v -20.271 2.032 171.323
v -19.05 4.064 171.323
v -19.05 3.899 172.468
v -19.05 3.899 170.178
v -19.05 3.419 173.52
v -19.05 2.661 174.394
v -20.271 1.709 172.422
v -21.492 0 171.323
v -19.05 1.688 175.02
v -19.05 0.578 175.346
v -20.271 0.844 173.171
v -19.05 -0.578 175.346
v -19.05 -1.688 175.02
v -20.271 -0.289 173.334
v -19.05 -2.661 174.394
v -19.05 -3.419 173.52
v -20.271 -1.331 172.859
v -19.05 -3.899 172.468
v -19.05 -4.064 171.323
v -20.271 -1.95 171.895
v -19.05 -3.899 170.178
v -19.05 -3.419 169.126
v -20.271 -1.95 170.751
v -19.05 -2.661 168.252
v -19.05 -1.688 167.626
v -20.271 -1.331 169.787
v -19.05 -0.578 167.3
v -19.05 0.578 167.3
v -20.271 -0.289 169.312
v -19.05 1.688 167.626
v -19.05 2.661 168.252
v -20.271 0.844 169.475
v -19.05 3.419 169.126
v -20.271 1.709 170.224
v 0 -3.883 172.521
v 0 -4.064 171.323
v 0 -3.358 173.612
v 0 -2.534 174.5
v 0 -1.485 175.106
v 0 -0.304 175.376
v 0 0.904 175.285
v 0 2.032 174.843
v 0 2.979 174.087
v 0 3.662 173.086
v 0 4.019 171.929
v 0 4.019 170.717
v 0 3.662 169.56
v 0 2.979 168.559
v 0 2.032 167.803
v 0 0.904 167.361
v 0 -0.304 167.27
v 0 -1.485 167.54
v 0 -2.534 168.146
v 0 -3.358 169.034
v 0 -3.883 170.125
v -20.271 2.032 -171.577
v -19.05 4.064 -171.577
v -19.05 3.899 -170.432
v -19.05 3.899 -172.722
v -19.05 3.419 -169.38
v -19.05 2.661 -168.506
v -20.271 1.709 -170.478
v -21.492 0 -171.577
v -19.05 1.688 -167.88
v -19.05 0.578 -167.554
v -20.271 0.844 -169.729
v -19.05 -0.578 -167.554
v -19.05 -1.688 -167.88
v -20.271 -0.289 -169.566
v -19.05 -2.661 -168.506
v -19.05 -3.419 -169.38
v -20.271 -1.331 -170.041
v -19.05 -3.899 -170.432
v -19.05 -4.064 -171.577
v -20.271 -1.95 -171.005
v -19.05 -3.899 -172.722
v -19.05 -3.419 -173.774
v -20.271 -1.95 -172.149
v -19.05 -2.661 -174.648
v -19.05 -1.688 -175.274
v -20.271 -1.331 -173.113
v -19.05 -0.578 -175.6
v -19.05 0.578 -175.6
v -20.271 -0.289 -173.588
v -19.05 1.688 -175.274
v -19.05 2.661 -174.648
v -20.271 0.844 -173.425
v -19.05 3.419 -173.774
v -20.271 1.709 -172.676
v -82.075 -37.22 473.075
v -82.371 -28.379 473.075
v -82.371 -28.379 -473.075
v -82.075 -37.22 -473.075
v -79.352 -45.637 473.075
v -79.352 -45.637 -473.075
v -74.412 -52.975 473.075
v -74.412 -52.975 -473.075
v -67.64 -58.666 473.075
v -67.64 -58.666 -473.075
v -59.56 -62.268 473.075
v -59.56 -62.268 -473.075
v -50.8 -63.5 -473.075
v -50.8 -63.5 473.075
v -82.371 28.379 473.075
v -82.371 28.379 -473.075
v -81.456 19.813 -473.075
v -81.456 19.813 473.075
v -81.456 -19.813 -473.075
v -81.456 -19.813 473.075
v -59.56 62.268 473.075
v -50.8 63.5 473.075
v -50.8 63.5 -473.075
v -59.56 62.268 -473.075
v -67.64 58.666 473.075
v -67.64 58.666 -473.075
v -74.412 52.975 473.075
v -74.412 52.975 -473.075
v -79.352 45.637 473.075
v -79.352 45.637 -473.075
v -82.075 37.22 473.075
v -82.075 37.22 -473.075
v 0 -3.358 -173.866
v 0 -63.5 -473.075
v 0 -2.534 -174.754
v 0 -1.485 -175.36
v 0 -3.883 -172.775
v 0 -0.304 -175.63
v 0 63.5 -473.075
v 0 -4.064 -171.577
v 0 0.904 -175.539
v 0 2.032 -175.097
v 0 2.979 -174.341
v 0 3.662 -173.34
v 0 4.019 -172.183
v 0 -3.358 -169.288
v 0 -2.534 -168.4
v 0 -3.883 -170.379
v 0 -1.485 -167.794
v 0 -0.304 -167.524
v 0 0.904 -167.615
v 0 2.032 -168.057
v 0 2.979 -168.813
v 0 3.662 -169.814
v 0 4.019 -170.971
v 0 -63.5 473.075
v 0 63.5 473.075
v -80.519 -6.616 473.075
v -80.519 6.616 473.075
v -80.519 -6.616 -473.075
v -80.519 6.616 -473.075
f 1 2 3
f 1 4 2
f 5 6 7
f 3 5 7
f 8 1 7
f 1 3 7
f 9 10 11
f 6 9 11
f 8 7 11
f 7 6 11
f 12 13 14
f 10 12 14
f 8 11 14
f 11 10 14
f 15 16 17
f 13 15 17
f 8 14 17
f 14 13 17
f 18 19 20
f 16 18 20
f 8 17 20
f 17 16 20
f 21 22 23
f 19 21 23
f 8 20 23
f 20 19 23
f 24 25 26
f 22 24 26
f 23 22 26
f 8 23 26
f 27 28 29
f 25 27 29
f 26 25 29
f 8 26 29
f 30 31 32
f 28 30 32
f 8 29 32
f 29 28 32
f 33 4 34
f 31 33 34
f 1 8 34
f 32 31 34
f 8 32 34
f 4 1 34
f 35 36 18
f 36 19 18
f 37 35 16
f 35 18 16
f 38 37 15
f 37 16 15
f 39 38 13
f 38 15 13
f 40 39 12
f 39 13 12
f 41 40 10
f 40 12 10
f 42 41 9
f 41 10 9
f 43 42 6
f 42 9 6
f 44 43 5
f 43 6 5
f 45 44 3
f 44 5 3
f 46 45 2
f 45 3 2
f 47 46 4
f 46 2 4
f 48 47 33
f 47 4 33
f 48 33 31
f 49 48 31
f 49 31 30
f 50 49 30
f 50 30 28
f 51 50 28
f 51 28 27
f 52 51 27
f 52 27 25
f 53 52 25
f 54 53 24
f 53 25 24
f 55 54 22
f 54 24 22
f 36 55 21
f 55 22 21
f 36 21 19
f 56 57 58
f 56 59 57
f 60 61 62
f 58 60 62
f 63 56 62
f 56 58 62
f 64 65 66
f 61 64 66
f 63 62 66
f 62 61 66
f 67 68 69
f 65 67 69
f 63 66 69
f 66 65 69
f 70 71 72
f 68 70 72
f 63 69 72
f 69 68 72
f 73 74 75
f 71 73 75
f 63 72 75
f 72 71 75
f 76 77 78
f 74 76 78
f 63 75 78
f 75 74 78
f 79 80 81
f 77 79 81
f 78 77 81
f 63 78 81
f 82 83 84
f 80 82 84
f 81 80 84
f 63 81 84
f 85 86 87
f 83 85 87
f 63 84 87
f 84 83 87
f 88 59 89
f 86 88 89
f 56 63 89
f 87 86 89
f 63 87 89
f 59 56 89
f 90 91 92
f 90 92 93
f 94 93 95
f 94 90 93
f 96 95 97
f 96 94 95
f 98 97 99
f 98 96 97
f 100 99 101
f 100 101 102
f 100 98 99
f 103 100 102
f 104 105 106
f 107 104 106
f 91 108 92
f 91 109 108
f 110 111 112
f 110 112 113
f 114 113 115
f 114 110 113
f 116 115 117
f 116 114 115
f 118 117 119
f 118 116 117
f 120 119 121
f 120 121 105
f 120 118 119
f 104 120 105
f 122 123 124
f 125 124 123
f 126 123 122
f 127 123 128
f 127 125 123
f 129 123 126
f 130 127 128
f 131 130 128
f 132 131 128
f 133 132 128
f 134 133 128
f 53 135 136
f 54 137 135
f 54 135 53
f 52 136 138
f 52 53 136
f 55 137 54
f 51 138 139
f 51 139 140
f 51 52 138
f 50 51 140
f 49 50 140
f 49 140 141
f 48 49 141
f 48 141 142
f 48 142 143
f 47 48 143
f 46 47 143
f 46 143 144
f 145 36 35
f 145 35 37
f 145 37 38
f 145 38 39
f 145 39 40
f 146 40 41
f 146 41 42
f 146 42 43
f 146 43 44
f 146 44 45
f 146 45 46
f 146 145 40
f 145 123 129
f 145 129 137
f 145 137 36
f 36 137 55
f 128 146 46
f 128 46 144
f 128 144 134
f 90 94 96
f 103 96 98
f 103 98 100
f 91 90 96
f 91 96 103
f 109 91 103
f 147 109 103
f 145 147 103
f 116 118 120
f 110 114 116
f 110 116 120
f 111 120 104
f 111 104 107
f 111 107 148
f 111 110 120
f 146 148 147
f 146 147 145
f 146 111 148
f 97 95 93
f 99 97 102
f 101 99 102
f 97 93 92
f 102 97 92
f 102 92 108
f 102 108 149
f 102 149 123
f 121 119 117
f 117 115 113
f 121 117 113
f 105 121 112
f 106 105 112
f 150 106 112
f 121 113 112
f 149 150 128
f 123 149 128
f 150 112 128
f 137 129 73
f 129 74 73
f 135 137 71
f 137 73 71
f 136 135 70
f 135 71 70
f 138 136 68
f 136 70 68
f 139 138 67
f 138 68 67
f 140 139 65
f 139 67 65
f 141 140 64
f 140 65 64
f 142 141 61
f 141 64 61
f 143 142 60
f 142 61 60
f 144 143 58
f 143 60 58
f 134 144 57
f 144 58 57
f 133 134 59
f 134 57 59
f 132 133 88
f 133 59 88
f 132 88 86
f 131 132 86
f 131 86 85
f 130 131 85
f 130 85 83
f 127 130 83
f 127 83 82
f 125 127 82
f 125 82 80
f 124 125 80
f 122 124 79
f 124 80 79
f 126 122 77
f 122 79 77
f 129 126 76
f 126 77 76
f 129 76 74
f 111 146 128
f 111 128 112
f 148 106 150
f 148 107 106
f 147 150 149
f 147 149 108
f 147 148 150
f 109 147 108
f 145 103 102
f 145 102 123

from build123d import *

# Parameters (mm, degrees)
EXTRUDE1_DEPTH               = 473.075
A_0_234_DIAMETER_HOLE1_D     = 8.128
A_0_234_DIAMETER_HOLE1_DEPTH = 19.05
A_0_234_DIAMETER_HOLE1_TIP   = 2.441897556


with BuildPart() as part:
    # Sketch1 → Extrude1 (new, symmetric)
    with BuildSketch(Plane.XY):
        with BuildLine():
            Line((-81.45600692, -19.8133218), (-82.370570719, -28.379308014))
            ThreePointArc((-82.370570719, -28.379308014), (-74.412305802, -52.975492096), (-50.8, -63.5))
            Line((-50.8, -63.5), (0, -63.5))
            Line((0, -63.5), (0, 63.5))
            Line((0, 63.5), (-50.8, 63.5))
            ThreePointArc((-50.8, 63.5), (-74.412305802, 52.975492096), (-82.370570719, 28.379308014))
            Line((-82.370570719, 28.379308014), (-81.45600692, 19.8133218))
            ThreePointArc((-81.45600692, 19.8133218), (-80.401300618, 0), (-81.45600692, -19.8133218))
        make_face()
    extrude(amount=EXTRUDE1_DEPTH, both=True)

    # A (0.234) Diameter Hole1
    with Locations(Plane(origin=(0, 0, 171.323), x_dir=(0, 1, 0), z_dir=(1, 0, 0))):
        with Locations((0, 0), (0, -342.9)):
            Hole(A_0_234_DIAMETER_HOLE1_D / 2, depth=A_0_234_DIAMETER_HOLE1_DEPTH)
            with Locations((0, 0, -(A_0_234_DIAMETER_HOLE1_DEPTH + A_0_234_DIAMETER_HOLE1_TIP / 2))):  # 118° drill point
                Cone(0, A_0_234_DIAMETER_HOLE1_D / 2, A_0_234_DIAMETER_HOLE1_TIP, mode=Mode.SUBTRACT)


solid = part.part
